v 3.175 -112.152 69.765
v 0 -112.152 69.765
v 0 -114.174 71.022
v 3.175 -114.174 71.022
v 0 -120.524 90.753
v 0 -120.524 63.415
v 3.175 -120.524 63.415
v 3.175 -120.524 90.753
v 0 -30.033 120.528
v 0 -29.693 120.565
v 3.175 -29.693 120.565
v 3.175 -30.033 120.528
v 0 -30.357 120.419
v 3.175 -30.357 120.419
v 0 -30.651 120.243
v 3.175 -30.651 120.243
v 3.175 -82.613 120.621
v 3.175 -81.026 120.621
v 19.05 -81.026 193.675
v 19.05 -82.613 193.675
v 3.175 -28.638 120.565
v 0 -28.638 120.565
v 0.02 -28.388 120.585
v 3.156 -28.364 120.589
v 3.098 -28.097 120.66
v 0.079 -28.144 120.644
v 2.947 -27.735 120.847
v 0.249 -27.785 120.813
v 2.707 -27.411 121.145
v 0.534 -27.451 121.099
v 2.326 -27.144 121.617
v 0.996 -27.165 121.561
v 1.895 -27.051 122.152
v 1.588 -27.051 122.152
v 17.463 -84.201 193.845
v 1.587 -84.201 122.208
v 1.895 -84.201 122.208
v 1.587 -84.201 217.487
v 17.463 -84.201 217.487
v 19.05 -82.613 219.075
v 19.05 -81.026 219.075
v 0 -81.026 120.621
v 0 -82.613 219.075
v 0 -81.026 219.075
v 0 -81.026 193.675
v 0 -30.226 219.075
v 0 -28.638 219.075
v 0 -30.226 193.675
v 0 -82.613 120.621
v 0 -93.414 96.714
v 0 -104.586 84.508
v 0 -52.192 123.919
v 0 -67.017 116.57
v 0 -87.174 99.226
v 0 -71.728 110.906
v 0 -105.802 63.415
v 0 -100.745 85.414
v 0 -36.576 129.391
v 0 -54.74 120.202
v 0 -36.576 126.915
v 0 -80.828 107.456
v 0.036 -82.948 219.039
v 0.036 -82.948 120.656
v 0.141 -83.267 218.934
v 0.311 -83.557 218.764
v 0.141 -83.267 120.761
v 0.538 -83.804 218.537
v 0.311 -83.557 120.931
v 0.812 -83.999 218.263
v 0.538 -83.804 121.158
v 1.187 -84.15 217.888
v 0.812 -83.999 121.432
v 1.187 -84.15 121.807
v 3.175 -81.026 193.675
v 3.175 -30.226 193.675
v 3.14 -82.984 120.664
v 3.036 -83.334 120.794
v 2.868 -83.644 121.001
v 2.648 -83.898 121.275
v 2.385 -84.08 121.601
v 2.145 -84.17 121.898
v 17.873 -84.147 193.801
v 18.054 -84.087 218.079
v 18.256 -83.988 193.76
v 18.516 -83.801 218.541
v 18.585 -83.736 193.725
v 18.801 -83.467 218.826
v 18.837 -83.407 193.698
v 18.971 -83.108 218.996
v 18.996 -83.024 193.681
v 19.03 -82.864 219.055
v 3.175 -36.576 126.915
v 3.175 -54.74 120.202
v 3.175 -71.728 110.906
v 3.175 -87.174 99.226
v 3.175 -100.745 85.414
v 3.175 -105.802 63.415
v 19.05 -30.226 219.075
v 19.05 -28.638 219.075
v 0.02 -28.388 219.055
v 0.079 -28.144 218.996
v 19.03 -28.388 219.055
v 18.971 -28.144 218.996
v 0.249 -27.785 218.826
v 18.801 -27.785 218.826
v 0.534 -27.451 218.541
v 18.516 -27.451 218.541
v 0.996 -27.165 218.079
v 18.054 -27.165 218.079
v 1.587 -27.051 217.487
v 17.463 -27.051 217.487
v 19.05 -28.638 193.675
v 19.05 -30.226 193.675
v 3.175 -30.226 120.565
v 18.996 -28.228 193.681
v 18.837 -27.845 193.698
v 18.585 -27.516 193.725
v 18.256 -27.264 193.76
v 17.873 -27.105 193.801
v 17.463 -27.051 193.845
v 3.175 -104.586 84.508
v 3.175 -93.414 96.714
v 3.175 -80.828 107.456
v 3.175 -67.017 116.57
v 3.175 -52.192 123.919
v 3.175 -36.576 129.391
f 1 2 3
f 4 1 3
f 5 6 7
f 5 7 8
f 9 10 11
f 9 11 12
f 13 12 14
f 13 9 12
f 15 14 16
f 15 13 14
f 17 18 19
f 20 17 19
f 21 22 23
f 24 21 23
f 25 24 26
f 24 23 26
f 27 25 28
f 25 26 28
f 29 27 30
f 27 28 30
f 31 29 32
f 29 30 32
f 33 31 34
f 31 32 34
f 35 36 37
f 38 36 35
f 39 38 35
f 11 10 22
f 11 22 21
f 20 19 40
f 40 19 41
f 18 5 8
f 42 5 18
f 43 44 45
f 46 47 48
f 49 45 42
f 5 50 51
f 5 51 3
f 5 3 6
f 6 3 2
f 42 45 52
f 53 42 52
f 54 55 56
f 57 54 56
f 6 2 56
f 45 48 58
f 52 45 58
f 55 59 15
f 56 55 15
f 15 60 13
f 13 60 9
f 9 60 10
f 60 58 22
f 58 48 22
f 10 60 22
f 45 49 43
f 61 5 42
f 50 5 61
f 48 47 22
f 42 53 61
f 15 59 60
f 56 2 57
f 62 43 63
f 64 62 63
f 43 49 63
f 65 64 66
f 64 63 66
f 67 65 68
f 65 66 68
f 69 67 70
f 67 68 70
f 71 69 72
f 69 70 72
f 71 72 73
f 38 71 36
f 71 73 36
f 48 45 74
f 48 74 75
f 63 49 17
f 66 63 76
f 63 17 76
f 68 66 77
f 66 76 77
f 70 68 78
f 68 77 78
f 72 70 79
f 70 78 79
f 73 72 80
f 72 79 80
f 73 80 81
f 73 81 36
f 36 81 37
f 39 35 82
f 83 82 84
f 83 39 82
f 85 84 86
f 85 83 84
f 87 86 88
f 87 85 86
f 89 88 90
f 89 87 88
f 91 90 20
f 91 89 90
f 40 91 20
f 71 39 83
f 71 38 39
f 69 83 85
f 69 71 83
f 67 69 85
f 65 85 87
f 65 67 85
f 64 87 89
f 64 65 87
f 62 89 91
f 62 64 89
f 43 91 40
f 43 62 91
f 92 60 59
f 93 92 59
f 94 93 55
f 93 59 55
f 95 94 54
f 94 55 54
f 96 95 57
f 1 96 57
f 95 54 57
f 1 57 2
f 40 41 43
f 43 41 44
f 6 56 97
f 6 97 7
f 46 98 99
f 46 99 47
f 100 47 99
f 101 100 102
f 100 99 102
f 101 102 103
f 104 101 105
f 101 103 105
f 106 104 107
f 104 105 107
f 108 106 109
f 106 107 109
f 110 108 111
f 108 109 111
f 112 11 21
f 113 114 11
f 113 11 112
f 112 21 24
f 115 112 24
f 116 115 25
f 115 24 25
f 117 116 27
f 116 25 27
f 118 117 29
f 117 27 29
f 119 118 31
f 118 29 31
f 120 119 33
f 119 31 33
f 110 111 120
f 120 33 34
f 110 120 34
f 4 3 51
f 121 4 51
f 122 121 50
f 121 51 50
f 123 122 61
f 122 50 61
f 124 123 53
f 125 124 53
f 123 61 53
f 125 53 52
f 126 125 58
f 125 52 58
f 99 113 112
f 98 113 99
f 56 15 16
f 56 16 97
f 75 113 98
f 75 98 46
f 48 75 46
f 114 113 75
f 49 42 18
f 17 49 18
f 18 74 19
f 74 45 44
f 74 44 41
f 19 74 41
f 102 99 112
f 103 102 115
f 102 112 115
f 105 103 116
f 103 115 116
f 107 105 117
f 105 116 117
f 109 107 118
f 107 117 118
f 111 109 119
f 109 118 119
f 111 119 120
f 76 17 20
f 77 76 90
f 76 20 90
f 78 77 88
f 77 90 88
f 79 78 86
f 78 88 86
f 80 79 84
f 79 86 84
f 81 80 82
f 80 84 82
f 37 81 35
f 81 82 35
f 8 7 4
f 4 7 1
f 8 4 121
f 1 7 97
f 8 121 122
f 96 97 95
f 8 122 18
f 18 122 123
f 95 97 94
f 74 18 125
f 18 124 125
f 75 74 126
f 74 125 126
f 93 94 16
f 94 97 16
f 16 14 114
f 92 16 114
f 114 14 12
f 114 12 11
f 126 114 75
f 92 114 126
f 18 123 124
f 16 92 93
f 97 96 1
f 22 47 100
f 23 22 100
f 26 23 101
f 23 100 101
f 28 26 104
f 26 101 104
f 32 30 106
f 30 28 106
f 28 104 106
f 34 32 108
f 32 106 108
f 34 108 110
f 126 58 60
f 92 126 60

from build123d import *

# Parameters (mm, degrees)
BOSS_EXTRUDE1_DEPTH = 3.175
BOSS_EXTRUDE2_DEPTH = 3.175
FILLET1_R           = 1.5875
BOSS_EXTRUDE3_DEPTH = 3.175
FILLET2_R           = 1.5875


with BuildPart() as part:
    # Sketch1 → Boss-Extrude1 (new body)
    with BuildSketch(Plane(origin=(0, 0, 0), x_dir=(0, 0, -1), z_dir=(1, 0, 0))):
        Polygon((-120.564627305, -30.226), (-63.414627305, -105.80178633), (-63.414627305, -120.523753631), (-90.752572968, -120.523753631), (-120.620560185, -81.026), (-193.675, -81.026), (-193.675, -30.226), align=None)
        with BuildLine():
            Line((-129.390973316, -36.576), (-126.914627305, -36.576))
            ThreePointArc((-126.914627305, -36.576), (-105.349927235, -79.665043976), (-69.764627305, -112.15178633))
            Line((-69.764627305, -112.15178633), (-71.022403038, -114.173753631))
            ThreePointArc((-71.022403038, -114.173753631), (-107.455726685, -80.827560609), (-129.390973316, -36.576))
        make_face(mode=Mode.SUBTRACT)
    extrude(amount=BOSS_EXTRUDE1_DEPTH)

    # Sketch2 → Boss-Extrude2 (add)
    with BuildSketch(Plane(origin=(0, -30.226, 0), x_dir=(1, 0, 0), z_dir=(0, 1, 0))):
        Polygon((0, -120.564627305), (3.175, -120.564627305), (19.05, -193.675), (19.05, -219.075), (0, -219.075), align=None)
    extrude(amount=BOSS_EXTRUDE2_DEPTH)

    # Fillet1
    # the kernel refuses this fillet: 1.5875 mm, written as the material it adds along each edge
    with BuildSketch(Plane(origin=(0, -30.226, 120.564627305), x_dir=(0, -0.7976221020191943, -0.6031575104153825), z_dir=(1, 0, 0))) as fillet1_piece_1:
        with BuildLine():
            CenterArc((FILLET1_R * 0.335530760185, FILLET1_R), FILLET1_R, 232.903626037, 37.096373963)
            Line((-FILLET1_R * 0.267626750231, FILLET1_R * 0.202377897981), (0, 0))
            Line((0, 0), (FILLET1_R * 0.335530760185, 0))
        make_face()
    extrude(amount=3.175)
    # the kernel refuses this fillet: 1.5875 mm, written as the material it takes off along each edge
    with BuildSketch(Plane(origin=(0, -27.051, 223.04375), x_dir=(0, -1, 0), z_dir=(0, 0, -1))) as fillet1_2_piece_1:
        with BuildLine():
            CenterArc((FILLET1_R, -FILLET1_R), FILLET1_R, 90, 90)
            Line((0, -FILLET1_R), (0, 0))
            Line((0, 0), (FILLET1_R, 0))
        make_face()
    extrude(amount=106.447872695, mode=Mode.SUBTRACT)
    with BuildSketch(Plane(origin=(23.01875, -27.051, 219.075), x_dir=(0, -1, 0), z_dir=(-1, 0, 0))) as fillet1_2_piece_2:
        with BuildLine():
            CenterArc((FILLET1_R, -FILLET1_R), FILLET1_R, 90, 90)
            Line((0, -FILLET1_R), (0, 0))
            Line((0, 0), (FILLET1_R, 0))
        make_face()
    extrude(amount=26.9875, mode=Mode.SUBTRACT)
    with BuildSketch(Plane(origin=(19.05, -27.051, 189.70625), x_dir=(-1, 0, 0), z_dir=(0, 0, 1))) as fillet1_2_piece_3:
        with BuildLine():
            CenterArc((FILLET1_R, FILLET1_R), FILLET1_R, 180, 90)
            Line((0, FILLET1_R), (0, 0))
            Line((0, 0), (FILLET1_R, 0))
        make_face()
    extrude(amount=33.3375, mode=Mode.SUBTRACT)
    with BuildSketch(Plane(origin=(2.332859982, -27.051, 116.686254354), x_dir=(-0.9772278303307078, 0, 0.21219276054365557), z_dir=(0.21219276054365557, 0, 0.9772278303307079))) as fillet1_2_piece_4:
        with BuildLine():
            CenterArc((FILLET1_R, FILLET1_R), FILLET1_R, 180, 90)
            Line((0, FILLET1_R), (0, 0))
            Line((0, 0), (FILLET1_R, 0))
        make_face()
    extrude(amount=82.751550957, mode=Mode.SUBTRACT)
    with BuildSketch(Plane(origin=(-3.96875, -27.051, 120.564627305), x_dir=(0, 0, 1), z_dir=(1, 0, 0))) as fillet1_2_piece_5:
        with BuildLine():
            CenterArc((FILLET1_R, FILLET1_R), FILLET1_R, 180, 90)
            Line((0, FILLET1_R), (0, 0))
            Line((0, 0), (FILLET1_R, 0))
        make_face()
    extrude(amount=11.1125, mode=Mode.SUBTRACT)

    # Sketch4 → Boss-Extrude3 (add)
    with BuildSketch(Plane.XZ.offset(81.026)):
        Polygon((0, 120.620560185), (3.175, 120.620560185), (19.05, 193.675), (19.05, 219.075), (0, 219.075), align=None)
    extrude(amount=BOSS_EXTRUDE3_DEPTH)

    # Fillet2
    fillet2_edges = [part.edges().sort_by_distance(p)[0] for p in [
        (0, -84.201, 169.847780093),
        (1.5875, -84.201, 120.620560185),
        (11.1125, -84.201, 157.147780093),
        (19.05, -84.201, 206.375),
        (9.525, -84.201, 219.075),
    ]]
    fillet(fillet2_edges, radius=FILLET2_R)


solid = part.part
